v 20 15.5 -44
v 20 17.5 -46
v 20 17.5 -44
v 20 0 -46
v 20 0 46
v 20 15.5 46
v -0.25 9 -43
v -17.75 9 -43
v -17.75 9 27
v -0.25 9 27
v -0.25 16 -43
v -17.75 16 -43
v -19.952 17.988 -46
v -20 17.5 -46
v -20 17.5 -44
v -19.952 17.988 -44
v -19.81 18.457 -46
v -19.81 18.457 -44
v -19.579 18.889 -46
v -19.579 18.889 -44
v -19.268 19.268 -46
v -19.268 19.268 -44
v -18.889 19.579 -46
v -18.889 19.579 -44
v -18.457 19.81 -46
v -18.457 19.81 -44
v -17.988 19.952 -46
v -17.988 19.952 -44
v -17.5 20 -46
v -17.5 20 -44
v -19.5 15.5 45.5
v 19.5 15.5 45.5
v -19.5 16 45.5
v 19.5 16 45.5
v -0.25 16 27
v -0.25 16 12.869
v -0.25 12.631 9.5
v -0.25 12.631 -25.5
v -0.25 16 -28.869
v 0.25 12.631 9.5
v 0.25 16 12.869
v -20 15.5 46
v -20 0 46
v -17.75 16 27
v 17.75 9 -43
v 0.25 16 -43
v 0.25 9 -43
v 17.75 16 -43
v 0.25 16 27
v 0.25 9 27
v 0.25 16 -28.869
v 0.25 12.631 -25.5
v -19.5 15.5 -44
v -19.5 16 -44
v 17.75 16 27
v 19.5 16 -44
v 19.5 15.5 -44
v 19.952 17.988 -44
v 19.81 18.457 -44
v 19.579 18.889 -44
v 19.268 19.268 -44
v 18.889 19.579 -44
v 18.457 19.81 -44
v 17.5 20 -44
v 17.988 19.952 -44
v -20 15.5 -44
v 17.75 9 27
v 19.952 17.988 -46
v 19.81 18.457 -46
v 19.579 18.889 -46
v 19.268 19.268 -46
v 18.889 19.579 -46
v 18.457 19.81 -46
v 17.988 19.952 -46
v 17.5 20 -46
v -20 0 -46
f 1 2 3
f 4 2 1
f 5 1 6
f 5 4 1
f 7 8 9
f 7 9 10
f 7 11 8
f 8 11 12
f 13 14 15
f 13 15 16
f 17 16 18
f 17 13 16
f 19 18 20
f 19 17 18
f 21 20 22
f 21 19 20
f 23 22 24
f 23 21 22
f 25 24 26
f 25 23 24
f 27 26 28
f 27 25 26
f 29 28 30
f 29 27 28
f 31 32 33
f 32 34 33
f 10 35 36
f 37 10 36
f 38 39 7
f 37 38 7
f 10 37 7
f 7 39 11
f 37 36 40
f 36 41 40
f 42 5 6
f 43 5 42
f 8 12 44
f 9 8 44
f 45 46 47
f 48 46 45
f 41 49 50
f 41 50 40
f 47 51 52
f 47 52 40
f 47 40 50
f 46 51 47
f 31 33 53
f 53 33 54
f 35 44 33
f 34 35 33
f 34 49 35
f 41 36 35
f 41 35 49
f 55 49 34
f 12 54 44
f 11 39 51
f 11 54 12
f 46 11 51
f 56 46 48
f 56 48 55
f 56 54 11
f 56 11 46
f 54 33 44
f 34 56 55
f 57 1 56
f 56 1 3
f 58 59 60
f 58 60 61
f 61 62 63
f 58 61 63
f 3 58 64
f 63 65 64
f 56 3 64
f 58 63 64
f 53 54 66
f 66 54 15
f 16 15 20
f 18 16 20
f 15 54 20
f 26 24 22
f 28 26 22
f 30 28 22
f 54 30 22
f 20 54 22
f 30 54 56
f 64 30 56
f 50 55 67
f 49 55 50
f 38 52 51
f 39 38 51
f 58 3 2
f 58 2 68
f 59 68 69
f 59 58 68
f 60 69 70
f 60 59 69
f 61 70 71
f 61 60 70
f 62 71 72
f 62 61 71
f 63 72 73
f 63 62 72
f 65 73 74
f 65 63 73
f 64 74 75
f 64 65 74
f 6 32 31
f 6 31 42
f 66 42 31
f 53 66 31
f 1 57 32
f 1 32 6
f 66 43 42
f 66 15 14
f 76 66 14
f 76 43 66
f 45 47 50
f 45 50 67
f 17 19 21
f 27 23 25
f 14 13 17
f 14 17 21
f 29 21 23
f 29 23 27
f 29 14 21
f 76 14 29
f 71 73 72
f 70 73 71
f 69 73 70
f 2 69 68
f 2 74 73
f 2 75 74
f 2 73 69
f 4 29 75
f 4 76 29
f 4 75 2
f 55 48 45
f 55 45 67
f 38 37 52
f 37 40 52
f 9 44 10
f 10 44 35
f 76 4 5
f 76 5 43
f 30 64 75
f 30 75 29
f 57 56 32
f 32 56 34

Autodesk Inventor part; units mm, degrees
ref_plane "YZ Plane" through (0, 0, 0) normal (1, 0, 0) x (0, 1, 0)
ref_plane "XZ Plane" through (0, 0, 0) normal (0, 1, 0) x (-1, 0, 0)
ref_plane "XY Plane" through (0, 0, 0) normal (0, 0, 1) x (1, 0, 0)
sketch "Sketch1" plane through (0, 0, 0) normal (0, 1, 0) x (-1, 0, 0)
  line L0 (-20, 46) -> (20, 46)
  line L1 (20, 46) -> (20, -46)
  line L2 (20, -46) -> (-20, -46)
  line L3 (-20, -46) -> (-20, 46)
  line L4 (-20, 46) -> (20, -46) construction
  line L5 (20, 46) -> (-20, -46) construction
  point P0 (0, 0)
  dimension "d0" = 40
  dimension "d1" = 92
extrude "Extrusion1" add sketch "Sketch1" along normal blind 20
sketch "Sketch2" plane through (0, 20, 0) normal (0, 1, 0) x (1, 0, 0)
  line L0 (-20, 46) -> (-20, -46) projected
  line L1 (20, -46) -> (20, 46) projected
  line L2 (-20, -46) -> (20, -46)
  line L3 (20, -46) -> (20, 44)
  line L4 (20, 44) -> (-20, 44)
  line L5 (-20, 44) -> (-20, -46)
  point P0 (0, 0)
  point P1 (-20, 44)
  dimension "d4" = 90
extrude "Extrusion2" cut sketch "Sketch2" against normal blind 4
sketch "Sketch3" plane through (0, 16, 0) normal (0, 1, 0) x (1, 0, 0)
  line L0 (0.25, 43) -> (17.75, 43)
  line L1 (17.75, 43) -> (17.75, -27)
  line L2 (17.75, -27) -> (0.25, -27)
  line L3 (0.25, -27) -> (0.25, 43)
  line L4 (20, 44) -> (20, -46) projected
  line L5 (-20, 44) -> (20, 44) projected
  line L6 (-17.75, -27) -> (-0.25, -27)
  line L7 (-0.25, -27) -> (-0.25, 43)
  line L8 (-0.25, 43) -> (-17.75, 43)
  line L9 (-17.75, 43) -> (-17.75, -27)
  line L10 (-20, -46) -> (-20, 44) projected
  point P0 (0, 0)
  dimension "d7" = 17.5
  dimension "d8" = 70
  dimension "d9" = 2.25
  dimension "d10" = 1
  dimension "d11" = 17.5
  dimension "d12" = 2.25
  dimension "d13" = 1
extrude "Extrusion3" cut sketch "Sketch3" against normal blind 7
sketch "Sketch4" plane through (0.25, 16, 27) normal (1, 0, 0) x (0, 0, -1)
  line L0 (0, 0) -> (70, 0) projected
  line L1 (14.131, 0) -> (17.5, -3.369)
  line L2 (17.5, -3.369) -> (52.5, -3.369)
  line L3 (70, 0) -> (0, 0) projected
  line L4 (52.5, -3.369) -> (55.869, 0)
  line L5 (0, 0) -> (0, -7) projected
  line L6 (70, 0) -> (70, -7) projected
  point P0 (27, -16)
  point P1 (0, -3.5)
  point P2 (70, -3.5)
  dimension "d16" = 45
  dimension "d17" = 45
  dimension "d18" = 17.5
  dimension "d19" = 17.5
extrude "Extrusion4" cut sketch "Sketch4" against normal up to surface (0.5 mm away)
fillet "Fillet1" radius 2.5 2 edges at (20, 20, -45) (-20, 20, -45)
sketch "Sketch5" plane through (0, 16, 0) normal (0, 1, 0) x (1, 0, 0)
  line L0 (20, 44) -> (20, -46) projected
  line L1 (-20, 44) -> (20, 44)
  line L2 (20, 44) -> (20, -46)
  line L3 (20, -46) -> (-20, -46)
  line L4 (-20, -46) -> (-20, 44)
  line L5 (-19.5, 44.1346) -> (19.5, 44.1346)
  line L6 (19.5, 44.1346) -> (19.5, -45.5)
  line L7 (19.5, -45.5) -> (-19.5, -45.5)
  line L8 (-19.5, -45.5) -> (-19.5, 44.1346)
  line L9 (-17.75, 43) -> (-0.25, 43) projected
  point P0 (0, 0)
  point P1 (19.5, 44)
  point P2 (-19.5, 44)
  dimension "d23" = 0.5
  dimension "d24" = 0.5
  dimension "d25" = 0.5
extrude "Extrusion5" cut sketch "Sketch5" against normal blind 0.5 contours L0 L3 L4 L1 L8 L7 L6
properties part number "Battery Pack 9.2x4" material "PC/ABS Plastic"
